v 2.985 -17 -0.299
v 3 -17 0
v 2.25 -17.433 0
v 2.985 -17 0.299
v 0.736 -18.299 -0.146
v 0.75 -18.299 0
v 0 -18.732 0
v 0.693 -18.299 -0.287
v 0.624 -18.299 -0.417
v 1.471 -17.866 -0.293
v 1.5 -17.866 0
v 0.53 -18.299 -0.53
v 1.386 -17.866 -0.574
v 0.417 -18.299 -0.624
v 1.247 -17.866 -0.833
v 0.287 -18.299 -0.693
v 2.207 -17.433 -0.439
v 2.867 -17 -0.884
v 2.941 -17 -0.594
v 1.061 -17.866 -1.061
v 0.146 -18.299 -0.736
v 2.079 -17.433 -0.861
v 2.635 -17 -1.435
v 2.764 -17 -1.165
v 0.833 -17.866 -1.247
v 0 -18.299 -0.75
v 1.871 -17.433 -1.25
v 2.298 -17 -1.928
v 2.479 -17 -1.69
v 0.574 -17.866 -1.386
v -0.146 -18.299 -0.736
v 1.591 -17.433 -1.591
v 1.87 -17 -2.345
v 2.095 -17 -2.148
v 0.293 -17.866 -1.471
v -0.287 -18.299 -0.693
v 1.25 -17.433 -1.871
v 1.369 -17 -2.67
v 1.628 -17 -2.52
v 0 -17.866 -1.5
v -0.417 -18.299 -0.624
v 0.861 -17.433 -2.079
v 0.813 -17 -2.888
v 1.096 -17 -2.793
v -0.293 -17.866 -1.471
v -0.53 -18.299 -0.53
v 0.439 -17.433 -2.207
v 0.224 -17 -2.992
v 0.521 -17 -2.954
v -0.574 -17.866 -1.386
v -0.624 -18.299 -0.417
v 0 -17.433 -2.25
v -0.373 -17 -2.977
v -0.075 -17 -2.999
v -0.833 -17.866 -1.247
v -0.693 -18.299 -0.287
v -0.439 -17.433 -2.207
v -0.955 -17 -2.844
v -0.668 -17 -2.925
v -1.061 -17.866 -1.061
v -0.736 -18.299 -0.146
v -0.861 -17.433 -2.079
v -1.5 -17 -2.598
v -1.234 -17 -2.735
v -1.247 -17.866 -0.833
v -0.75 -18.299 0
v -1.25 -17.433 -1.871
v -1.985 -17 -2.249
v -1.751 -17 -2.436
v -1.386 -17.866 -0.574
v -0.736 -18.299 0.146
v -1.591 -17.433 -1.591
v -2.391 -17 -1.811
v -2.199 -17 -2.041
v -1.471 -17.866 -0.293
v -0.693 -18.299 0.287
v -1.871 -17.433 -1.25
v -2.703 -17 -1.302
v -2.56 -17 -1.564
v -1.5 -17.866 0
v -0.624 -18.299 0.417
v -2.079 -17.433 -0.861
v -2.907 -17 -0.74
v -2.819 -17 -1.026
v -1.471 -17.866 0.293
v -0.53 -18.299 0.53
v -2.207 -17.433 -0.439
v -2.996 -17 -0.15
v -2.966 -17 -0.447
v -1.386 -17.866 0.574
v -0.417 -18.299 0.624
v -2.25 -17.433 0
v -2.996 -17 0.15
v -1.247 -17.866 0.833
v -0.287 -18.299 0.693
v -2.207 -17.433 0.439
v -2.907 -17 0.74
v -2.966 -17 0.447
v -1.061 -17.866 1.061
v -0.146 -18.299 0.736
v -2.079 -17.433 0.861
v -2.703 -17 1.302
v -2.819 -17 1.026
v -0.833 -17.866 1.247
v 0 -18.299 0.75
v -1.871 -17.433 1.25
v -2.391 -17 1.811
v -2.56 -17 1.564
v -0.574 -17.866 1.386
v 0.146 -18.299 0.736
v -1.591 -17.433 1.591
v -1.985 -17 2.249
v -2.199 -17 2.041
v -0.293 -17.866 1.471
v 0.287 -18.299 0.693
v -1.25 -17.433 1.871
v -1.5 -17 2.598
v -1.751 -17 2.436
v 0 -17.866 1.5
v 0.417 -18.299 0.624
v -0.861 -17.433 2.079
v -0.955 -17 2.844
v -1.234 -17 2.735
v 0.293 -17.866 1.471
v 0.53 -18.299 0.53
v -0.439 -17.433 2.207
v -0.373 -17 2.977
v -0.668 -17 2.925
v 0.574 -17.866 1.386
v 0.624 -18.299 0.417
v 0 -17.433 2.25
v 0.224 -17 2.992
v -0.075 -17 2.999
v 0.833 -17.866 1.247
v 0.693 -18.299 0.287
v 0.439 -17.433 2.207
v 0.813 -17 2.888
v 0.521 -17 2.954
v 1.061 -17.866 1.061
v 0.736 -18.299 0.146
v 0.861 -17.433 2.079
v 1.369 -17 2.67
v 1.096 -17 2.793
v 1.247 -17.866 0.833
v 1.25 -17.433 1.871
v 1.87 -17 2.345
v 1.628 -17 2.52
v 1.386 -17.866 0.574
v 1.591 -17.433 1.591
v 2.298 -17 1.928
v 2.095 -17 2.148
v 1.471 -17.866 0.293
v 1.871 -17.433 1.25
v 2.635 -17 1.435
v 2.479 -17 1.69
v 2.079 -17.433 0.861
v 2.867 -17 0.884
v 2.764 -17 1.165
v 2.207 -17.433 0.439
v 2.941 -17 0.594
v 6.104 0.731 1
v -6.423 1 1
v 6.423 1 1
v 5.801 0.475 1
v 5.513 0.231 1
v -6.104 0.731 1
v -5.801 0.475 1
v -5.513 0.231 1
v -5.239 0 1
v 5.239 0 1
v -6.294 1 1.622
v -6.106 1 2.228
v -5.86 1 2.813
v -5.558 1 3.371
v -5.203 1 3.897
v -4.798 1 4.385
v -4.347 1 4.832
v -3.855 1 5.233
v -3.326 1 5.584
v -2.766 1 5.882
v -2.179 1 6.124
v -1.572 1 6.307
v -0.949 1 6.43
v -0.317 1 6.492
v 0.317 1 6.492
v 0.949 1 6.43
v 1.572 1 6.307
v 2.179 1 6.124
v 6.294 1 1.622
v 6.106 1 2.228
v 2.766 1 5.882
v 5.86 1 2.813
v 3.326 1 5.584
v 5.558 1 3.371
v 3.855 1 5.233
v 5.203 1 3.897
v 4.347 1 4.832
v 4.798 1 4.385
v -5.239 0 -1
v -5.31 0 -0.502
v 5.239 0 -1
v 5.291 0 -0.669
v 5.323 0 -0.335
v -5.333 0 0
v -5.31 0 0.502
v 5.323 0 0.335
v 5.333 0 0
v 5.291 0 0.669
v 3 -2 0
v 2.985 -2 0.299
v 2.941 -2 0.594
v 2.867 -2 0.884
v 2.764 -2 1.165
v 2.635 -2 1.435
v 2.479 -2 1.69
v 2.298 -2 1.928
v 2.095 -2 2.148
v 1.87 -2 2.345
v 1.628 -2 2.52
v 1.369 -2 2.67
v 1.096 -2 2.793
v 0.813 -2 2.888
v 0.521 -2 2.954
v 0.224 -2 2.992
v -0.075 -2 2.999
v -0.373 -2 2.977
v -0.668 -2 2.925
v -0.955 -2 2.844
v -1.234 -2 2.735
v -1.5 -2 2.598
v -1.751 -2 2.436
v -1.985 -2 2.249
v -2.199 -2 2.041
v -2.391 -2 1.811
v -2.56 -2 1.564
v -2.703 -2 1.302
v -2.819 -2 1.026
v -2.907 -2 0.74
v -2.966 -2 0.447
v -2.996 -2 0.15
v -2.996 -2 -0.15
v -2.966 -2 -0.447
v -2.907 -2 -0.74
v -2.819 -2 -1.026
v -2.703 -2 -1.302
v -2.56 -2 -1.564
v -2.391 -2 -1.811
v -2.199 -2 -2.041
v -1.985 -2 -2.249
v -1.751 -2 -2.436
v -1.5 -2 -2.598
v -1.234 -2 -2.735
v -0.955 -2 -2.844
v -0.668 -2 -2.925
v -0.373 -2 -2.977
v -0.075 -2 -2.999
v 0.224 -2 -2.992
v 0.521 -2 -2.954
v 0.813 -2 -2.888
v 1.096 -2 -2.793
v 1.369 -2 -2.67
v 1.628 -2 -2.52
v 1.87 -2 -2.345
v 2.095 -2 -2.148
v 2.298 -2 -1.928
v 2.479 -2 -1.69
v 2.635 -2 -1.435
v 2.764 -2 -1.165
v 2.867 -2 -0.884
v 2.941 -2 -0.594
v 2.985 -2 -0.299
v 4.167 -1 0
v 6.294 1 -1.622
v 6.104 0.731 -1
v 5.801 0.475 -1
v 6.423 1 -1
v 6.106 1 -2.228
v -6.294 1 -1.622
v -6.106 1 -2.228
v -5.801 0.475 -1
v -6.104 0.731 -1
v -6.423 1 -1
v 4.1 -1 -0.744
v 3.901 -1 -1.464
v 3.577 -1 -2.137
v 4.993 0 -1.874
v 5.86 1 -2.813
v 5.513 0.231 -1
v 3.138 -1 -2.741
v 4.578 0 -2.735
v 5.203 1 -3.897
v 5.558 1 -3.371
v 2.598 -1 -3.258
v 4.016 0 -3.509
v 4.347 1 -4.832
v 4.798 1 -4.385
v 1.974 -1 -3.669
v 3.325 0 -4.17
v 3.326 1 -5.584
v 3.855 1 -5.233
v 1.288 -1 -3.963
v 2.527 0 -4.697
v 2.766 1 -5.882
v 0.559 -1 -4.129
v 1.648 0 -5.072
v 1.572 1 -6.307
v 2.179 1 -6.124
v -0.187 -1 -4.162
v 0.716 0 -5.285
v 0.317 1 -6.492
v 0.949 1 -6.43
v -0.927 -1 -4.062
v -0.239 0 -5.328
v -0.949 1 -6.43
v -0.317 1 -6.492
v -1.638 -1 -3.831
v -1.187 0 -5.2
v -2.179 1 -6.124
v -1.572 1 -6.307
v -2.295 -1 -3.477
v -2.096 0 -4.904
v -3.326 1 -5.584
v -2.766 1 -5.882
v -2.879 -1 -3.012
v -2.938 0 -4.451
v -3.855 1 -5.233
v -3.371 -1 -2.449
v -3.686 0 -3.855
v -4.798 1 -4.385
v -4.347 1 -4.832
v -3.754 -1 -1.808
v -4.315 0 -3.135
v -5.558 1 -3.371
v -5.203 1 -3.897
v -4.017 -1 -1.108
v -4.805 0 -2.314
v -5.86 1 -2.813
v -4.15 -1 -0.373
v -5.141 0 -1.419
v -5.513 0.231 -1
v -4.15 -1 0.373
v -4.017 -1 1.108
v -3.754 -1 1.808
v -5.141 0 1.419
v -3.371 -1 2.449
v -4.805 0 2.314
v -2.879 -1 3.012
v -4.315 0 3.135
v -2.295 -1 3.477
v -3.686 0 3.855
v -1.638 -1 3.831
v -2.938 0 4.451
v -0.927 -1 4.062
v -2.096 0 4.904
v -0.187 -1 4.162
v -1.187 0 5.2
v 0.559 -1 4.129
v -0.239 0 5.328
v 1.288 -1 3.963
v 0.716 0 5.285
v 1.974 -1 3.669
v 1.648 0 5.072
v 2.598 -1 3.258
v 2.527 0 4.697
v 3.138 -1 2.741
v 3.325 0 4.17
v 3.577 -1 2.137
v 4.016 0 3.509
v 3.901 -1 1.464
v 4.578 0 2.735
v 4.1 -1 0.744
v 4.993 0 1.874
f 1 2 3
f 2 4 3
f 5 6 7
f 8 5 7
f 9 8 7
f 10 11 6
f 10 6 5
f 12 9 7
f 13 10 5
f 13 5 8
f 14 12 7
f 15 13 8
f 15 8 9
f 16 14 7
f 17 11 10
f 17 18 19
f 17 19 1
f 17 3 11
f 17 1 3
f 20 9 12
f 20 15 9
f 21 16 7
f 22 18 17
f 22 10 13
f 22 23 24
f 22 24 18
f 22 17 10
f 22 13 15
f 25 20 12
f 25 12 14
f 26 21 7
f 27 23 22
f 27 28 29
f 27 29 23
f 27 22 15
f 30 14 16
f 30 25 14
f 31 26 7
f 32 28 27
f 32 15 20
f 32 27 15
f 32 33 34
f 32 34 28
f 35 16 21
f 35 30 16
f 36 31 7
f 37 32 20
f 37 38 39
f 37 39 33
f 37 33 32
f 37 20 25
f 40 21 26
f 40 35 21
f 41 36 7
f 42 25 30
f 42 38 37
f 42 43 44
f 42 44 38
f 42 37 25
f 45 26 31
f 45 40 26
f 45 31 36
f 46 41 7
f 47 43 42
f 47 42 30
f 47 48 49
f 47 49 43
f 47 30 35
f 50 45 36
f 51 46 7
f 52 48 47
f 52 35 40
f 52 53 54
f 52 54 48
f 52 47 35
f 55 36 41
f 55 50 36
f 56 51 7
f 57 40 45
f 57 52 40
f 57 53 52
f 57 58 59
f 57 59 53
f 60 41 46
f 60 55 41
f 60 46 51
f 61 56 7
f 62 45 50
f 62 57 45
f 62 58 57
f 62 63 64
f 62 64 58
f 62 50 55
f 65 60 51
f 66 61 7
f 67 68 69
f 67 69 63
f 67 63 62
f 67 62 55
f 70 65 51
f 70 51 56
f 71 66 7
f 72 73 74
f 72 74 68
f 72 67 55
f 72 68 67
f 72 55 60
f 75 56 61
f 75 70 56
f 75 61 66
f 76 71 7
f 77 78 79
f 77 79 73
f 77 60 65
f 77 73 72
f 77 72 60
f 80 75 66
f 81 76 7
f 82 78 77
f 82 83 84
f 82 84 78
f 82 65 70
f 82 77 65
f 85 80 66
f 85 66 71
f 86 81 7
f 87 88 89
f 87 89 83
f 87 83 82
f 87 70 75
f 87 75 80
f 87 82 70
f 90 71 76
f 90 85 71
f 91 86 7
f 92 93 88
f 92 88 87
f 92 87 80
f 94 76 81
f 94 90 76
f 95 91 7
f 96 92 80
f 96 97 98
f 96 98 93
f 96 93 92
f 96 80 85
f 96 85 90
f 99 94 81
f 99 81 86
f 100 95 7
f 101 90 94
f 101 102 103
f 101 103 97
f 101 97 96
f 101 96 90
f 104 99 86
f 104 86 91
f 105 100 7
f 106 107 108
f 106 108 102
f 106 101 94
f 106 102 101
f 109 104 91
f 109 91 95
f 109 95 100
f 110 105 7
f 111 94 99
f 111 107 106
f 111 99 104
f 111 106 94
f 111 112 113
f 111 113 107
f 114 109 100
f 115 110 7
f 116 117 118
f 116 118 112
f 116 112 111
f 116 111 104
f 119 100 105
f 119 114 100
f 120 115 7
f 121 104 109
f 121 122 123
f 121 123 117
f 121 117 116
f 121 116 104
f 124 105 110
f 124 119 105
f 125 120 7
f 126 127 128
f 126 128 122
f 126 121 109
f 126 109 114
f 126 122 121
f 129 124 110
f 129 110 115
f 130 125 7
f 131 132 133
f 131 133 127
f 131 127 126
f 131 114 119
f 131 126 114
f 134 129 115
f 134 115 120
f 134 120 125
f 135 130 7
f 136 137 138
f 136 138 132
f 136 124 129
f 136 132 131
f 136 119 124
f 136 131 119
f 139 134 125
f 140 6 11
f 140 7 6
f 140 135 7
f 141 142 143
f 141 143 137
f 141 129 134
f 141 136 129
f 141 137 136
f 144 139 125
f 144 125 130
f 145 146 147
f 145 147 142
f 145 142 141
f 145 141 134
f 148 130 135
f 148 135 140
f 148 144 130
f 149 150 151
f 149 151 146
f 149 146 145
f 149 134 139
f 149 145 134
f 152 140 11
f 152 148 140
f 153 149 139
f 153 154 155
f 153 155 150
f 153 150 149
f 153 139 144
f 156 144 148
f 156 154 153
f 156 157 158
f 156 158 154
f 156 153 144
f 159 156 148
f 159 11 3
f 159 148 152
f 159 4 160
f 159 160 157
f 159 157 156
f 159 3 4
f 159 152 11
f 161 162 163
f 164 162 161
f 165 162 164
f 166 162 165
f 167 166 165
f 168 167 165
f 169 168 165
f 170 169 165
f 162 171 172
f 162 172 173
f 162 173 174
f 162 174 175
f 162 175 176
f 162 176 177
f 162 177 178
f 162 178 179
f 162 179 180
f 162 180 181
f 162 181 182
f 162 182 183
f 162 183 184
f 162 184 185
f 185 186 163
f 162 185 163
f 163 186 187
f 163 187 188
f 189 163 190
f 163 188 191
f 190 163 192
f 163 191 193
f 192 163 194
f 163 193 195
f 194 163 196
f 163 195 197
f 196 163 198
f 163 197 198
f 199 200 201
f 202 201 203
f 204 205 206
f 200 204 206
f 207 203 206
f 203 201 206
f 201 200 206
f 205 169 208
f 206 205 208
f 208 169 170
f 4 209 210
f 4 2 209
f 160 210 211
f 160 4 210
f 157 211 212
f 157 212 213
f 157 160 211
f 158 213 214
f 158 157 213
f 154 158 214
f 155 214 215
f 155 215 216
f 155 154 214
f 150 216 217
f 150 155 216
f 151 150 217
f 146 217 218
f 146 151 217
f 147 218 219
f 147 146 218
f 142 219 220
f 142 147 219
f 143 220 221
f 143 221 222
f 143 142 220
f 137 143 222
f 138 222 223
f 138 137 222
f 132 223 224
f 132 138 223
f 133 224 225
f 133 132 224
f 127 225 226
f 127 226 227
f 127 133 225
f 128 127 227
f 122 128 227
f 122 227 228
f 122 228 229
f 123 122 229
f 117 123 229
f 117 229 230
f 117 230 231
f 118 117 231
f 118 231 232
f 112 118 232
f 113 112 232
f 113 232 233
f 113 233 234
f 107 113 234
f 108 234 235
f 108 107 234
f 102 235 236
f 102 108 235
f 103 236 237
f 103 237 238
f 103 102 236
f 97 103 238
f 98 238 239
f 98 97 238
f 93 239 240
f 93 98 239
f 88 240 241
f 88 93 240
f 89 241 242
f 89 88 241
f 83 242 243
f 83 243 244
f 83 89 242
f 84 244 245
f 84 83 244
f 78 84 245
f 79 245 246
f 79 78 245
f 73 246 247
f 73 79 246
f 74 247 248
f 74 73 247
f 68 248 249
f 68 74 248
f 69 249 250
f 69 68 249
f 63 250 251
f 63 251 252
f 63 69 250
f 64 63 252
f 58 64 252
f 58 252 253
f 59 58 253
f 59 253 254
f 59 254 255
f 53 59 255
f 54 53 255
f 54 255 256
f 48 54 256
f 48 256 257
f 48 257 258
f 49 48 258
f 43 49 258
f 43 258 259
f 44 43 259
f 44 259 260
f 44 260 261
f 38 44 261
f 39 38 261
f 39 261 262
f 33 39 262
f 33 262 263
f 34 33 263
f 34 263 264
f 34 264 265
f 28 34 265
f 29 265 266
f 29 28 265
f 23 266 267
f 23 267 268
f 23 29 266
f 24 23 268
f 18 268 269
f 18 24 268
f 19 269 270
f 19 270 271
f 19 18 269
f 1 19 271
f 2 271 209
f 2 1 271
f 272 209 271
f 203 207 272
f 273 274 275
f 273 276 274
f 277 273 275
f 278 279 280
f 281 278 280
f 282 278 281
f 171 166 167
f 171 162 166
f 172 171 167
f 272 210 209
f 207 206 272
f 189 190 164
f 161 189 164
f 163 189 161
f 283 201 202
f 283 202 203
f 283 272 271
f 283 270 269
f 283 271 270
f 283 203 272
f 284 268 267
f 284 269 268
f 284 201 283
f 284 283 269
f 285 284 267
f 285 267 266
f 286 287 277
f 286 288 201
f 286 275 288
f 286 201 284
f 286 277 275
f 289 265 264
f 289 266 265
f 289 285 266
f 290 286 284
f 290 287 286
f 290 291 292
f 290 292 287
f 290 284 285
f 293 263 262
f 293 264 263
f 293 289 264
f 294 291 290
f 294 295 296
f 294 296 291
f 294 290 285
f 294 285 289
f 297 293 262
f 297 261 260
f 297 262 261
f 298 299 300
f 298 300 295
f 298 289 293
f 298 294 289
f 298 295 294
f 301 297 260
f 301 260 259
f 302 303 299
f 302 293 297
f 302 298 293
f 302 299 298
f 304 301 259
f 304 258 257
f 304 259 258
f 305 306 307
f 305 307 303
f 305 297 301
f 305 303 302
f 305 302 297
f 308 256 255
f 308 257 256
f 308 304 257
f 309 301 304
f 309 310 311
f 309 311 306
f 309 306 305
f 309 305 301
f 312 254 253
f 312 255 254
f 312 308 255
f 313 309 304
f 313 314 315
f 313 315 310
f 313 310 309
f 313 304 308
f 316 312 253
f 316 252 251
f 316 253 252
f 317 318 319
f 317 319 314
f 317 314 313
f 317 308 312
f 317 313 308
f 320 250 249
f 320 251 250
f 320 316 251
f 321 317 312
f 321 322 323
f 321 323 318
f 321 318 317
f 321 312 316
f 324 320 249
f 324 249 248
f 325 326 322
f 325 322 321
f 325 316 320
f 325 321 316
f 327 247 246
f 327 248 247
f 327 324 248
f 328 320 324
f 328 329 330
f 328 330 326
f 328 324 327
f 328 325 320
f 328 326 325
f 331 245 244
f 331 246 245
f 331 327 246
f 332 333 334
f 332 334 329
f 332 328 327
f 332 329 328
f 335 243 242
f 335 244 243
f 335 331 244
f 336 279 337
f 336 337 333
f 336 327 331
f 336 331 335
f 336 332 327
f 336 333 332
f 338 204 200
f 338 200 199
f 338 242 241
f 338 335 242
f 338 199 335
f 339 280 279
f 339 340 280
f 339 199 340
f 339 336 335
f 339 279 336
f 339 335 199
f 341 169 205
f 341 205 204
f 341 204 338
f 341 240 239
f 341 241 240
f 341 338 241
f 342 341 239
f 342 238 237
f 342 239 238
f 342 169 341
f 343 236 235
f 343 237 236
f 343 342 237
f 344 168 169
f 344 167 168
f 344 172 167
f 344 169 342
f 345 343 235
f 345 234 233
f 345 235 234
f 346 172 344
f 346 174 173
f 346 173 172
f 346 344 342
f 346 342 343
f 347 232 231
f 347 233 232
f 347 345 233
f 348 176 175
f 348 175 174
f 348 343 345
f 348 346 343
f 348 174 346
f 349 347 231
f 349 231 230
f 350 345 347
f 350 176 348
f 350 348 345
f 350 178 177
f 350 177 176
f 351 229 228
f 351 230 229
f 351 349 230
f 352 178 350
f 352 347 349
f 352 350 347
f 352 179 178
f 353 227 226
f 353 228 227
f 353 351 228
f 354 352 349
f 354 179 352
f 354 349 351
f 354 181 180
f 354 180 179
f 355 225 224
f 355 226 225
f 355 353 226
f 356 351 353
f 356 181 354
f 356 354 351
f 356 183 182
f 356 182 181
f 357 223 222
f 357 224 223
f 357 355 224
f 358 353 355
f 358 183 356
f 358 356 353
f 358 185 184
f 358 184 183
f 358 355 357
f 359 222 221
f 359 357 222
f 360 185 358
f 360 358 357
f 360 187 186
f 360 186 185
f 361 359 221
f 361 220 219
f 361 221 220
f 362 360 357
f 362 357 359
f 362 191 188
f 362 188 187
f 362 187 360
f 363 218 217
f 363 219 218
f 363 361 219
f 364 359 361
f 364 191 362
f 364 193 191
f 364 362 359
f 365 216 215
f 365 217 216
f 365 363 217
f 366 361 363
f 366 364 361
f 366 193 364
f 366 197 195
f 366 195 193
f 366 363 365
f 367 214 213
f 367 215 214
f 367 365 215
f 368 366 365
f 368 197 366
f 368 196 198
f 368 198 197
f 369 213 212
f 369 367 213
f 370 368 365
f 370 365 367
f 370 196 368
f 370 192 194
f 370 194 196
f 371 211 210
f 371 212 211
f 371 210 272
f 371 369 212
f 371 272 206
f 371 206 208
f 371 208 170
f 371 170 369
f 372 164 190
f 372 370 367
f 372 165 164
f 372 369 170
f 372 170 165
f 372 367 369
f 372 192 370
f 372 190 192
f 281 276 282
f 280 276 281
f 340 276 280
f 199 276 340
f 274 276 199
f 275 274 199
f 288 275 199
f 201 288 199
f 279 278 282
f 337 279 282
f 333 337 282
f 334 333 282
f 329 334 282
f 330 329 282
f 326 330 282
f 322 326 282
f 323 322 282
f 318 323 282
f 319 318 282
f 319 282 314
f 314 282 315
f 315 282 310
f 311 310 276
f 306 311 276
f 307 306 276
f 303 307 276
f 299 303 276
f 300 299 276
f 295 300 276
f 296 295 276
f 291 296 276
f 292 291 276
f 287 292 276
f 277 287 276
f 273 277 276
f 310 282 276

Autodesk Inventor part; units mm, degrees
ref_plane "YZ Plane" through (0, 0, 0) normal (1, 0, 0) x (0, 1, 0)
ref_plane "XZ Plane" through (0, 0, 0) normal (0, 1, 0) x (-1, 0, 0)
ref_plane "XY Plane" through (0, 0, 0) normal (0, 0, 1) x (1, 0, 0)
sketch "Sketch1" plane through (0, 0, 0) normal (0, 0, 1) x (1, 0, 0)
  line L0 (0, 15.0207) -> (0, -34.9793) construction
  line L1 (0, 15.0207) -> (50, 15.0207) construction
  line L2 (0, 0) -> (1, 0)
  line L3 (1, 0) -> (1, 1)
  line L4 (1, 1) -> (6.5, 1)
  line L5 (6.5, 1) -> (3, -2)
  line L6 (3, -2) -> (3, -17)
  line L7 (3, -17) -> (0, -18.7321)
  line L8 (0, -26.021) -> (0, -26.021)
  line L9 (0, 0) -> (0, -18.7321)
  dimension "d4" = 50
  dimension "d6" = 1
  dimension "d7" = 1
  dimension "d8" = 5.5
  dimension "d9" = 3
  dimension "d10" = 0
  dimension "d11" = 0
  dimension "d12" = 15
  dimension "d13" = 3
  dimension "d15" = 60
  dimension "d17" = 60
  dimension "d18" = 139.399
  dimension "d19" = 15.0207
  dimension "d20" = 41.0417
revolve "Revolution1" add sketch "Sketch1" angle 360 about axis through (0, 15.0207, 0) along (0, -1, 0)
sketch "Sketch2" plane through (0, 1, 0) normal (0, 1, 0) x (1, 0, 0)
  line L0 (-12.6442, -1) -> (7.3558, -1)
  line L1 (7.3558, -1) -> (7.3558, 1)
  line L2 (7.3558, 1) -> (-12.6442, 1)
  line L3 (-12.6442, 1) -> (-12.6442, -1)
  circle A0 centre (0, 0) radius 1 projected
  dimension "d23" = 20
  dimension "d24" = 2
  dimension "d25" = 0
extrude "Extrusion1" cut sketch "Sketch2" against normal blind 1
properties part number "Pieza10 IG"
